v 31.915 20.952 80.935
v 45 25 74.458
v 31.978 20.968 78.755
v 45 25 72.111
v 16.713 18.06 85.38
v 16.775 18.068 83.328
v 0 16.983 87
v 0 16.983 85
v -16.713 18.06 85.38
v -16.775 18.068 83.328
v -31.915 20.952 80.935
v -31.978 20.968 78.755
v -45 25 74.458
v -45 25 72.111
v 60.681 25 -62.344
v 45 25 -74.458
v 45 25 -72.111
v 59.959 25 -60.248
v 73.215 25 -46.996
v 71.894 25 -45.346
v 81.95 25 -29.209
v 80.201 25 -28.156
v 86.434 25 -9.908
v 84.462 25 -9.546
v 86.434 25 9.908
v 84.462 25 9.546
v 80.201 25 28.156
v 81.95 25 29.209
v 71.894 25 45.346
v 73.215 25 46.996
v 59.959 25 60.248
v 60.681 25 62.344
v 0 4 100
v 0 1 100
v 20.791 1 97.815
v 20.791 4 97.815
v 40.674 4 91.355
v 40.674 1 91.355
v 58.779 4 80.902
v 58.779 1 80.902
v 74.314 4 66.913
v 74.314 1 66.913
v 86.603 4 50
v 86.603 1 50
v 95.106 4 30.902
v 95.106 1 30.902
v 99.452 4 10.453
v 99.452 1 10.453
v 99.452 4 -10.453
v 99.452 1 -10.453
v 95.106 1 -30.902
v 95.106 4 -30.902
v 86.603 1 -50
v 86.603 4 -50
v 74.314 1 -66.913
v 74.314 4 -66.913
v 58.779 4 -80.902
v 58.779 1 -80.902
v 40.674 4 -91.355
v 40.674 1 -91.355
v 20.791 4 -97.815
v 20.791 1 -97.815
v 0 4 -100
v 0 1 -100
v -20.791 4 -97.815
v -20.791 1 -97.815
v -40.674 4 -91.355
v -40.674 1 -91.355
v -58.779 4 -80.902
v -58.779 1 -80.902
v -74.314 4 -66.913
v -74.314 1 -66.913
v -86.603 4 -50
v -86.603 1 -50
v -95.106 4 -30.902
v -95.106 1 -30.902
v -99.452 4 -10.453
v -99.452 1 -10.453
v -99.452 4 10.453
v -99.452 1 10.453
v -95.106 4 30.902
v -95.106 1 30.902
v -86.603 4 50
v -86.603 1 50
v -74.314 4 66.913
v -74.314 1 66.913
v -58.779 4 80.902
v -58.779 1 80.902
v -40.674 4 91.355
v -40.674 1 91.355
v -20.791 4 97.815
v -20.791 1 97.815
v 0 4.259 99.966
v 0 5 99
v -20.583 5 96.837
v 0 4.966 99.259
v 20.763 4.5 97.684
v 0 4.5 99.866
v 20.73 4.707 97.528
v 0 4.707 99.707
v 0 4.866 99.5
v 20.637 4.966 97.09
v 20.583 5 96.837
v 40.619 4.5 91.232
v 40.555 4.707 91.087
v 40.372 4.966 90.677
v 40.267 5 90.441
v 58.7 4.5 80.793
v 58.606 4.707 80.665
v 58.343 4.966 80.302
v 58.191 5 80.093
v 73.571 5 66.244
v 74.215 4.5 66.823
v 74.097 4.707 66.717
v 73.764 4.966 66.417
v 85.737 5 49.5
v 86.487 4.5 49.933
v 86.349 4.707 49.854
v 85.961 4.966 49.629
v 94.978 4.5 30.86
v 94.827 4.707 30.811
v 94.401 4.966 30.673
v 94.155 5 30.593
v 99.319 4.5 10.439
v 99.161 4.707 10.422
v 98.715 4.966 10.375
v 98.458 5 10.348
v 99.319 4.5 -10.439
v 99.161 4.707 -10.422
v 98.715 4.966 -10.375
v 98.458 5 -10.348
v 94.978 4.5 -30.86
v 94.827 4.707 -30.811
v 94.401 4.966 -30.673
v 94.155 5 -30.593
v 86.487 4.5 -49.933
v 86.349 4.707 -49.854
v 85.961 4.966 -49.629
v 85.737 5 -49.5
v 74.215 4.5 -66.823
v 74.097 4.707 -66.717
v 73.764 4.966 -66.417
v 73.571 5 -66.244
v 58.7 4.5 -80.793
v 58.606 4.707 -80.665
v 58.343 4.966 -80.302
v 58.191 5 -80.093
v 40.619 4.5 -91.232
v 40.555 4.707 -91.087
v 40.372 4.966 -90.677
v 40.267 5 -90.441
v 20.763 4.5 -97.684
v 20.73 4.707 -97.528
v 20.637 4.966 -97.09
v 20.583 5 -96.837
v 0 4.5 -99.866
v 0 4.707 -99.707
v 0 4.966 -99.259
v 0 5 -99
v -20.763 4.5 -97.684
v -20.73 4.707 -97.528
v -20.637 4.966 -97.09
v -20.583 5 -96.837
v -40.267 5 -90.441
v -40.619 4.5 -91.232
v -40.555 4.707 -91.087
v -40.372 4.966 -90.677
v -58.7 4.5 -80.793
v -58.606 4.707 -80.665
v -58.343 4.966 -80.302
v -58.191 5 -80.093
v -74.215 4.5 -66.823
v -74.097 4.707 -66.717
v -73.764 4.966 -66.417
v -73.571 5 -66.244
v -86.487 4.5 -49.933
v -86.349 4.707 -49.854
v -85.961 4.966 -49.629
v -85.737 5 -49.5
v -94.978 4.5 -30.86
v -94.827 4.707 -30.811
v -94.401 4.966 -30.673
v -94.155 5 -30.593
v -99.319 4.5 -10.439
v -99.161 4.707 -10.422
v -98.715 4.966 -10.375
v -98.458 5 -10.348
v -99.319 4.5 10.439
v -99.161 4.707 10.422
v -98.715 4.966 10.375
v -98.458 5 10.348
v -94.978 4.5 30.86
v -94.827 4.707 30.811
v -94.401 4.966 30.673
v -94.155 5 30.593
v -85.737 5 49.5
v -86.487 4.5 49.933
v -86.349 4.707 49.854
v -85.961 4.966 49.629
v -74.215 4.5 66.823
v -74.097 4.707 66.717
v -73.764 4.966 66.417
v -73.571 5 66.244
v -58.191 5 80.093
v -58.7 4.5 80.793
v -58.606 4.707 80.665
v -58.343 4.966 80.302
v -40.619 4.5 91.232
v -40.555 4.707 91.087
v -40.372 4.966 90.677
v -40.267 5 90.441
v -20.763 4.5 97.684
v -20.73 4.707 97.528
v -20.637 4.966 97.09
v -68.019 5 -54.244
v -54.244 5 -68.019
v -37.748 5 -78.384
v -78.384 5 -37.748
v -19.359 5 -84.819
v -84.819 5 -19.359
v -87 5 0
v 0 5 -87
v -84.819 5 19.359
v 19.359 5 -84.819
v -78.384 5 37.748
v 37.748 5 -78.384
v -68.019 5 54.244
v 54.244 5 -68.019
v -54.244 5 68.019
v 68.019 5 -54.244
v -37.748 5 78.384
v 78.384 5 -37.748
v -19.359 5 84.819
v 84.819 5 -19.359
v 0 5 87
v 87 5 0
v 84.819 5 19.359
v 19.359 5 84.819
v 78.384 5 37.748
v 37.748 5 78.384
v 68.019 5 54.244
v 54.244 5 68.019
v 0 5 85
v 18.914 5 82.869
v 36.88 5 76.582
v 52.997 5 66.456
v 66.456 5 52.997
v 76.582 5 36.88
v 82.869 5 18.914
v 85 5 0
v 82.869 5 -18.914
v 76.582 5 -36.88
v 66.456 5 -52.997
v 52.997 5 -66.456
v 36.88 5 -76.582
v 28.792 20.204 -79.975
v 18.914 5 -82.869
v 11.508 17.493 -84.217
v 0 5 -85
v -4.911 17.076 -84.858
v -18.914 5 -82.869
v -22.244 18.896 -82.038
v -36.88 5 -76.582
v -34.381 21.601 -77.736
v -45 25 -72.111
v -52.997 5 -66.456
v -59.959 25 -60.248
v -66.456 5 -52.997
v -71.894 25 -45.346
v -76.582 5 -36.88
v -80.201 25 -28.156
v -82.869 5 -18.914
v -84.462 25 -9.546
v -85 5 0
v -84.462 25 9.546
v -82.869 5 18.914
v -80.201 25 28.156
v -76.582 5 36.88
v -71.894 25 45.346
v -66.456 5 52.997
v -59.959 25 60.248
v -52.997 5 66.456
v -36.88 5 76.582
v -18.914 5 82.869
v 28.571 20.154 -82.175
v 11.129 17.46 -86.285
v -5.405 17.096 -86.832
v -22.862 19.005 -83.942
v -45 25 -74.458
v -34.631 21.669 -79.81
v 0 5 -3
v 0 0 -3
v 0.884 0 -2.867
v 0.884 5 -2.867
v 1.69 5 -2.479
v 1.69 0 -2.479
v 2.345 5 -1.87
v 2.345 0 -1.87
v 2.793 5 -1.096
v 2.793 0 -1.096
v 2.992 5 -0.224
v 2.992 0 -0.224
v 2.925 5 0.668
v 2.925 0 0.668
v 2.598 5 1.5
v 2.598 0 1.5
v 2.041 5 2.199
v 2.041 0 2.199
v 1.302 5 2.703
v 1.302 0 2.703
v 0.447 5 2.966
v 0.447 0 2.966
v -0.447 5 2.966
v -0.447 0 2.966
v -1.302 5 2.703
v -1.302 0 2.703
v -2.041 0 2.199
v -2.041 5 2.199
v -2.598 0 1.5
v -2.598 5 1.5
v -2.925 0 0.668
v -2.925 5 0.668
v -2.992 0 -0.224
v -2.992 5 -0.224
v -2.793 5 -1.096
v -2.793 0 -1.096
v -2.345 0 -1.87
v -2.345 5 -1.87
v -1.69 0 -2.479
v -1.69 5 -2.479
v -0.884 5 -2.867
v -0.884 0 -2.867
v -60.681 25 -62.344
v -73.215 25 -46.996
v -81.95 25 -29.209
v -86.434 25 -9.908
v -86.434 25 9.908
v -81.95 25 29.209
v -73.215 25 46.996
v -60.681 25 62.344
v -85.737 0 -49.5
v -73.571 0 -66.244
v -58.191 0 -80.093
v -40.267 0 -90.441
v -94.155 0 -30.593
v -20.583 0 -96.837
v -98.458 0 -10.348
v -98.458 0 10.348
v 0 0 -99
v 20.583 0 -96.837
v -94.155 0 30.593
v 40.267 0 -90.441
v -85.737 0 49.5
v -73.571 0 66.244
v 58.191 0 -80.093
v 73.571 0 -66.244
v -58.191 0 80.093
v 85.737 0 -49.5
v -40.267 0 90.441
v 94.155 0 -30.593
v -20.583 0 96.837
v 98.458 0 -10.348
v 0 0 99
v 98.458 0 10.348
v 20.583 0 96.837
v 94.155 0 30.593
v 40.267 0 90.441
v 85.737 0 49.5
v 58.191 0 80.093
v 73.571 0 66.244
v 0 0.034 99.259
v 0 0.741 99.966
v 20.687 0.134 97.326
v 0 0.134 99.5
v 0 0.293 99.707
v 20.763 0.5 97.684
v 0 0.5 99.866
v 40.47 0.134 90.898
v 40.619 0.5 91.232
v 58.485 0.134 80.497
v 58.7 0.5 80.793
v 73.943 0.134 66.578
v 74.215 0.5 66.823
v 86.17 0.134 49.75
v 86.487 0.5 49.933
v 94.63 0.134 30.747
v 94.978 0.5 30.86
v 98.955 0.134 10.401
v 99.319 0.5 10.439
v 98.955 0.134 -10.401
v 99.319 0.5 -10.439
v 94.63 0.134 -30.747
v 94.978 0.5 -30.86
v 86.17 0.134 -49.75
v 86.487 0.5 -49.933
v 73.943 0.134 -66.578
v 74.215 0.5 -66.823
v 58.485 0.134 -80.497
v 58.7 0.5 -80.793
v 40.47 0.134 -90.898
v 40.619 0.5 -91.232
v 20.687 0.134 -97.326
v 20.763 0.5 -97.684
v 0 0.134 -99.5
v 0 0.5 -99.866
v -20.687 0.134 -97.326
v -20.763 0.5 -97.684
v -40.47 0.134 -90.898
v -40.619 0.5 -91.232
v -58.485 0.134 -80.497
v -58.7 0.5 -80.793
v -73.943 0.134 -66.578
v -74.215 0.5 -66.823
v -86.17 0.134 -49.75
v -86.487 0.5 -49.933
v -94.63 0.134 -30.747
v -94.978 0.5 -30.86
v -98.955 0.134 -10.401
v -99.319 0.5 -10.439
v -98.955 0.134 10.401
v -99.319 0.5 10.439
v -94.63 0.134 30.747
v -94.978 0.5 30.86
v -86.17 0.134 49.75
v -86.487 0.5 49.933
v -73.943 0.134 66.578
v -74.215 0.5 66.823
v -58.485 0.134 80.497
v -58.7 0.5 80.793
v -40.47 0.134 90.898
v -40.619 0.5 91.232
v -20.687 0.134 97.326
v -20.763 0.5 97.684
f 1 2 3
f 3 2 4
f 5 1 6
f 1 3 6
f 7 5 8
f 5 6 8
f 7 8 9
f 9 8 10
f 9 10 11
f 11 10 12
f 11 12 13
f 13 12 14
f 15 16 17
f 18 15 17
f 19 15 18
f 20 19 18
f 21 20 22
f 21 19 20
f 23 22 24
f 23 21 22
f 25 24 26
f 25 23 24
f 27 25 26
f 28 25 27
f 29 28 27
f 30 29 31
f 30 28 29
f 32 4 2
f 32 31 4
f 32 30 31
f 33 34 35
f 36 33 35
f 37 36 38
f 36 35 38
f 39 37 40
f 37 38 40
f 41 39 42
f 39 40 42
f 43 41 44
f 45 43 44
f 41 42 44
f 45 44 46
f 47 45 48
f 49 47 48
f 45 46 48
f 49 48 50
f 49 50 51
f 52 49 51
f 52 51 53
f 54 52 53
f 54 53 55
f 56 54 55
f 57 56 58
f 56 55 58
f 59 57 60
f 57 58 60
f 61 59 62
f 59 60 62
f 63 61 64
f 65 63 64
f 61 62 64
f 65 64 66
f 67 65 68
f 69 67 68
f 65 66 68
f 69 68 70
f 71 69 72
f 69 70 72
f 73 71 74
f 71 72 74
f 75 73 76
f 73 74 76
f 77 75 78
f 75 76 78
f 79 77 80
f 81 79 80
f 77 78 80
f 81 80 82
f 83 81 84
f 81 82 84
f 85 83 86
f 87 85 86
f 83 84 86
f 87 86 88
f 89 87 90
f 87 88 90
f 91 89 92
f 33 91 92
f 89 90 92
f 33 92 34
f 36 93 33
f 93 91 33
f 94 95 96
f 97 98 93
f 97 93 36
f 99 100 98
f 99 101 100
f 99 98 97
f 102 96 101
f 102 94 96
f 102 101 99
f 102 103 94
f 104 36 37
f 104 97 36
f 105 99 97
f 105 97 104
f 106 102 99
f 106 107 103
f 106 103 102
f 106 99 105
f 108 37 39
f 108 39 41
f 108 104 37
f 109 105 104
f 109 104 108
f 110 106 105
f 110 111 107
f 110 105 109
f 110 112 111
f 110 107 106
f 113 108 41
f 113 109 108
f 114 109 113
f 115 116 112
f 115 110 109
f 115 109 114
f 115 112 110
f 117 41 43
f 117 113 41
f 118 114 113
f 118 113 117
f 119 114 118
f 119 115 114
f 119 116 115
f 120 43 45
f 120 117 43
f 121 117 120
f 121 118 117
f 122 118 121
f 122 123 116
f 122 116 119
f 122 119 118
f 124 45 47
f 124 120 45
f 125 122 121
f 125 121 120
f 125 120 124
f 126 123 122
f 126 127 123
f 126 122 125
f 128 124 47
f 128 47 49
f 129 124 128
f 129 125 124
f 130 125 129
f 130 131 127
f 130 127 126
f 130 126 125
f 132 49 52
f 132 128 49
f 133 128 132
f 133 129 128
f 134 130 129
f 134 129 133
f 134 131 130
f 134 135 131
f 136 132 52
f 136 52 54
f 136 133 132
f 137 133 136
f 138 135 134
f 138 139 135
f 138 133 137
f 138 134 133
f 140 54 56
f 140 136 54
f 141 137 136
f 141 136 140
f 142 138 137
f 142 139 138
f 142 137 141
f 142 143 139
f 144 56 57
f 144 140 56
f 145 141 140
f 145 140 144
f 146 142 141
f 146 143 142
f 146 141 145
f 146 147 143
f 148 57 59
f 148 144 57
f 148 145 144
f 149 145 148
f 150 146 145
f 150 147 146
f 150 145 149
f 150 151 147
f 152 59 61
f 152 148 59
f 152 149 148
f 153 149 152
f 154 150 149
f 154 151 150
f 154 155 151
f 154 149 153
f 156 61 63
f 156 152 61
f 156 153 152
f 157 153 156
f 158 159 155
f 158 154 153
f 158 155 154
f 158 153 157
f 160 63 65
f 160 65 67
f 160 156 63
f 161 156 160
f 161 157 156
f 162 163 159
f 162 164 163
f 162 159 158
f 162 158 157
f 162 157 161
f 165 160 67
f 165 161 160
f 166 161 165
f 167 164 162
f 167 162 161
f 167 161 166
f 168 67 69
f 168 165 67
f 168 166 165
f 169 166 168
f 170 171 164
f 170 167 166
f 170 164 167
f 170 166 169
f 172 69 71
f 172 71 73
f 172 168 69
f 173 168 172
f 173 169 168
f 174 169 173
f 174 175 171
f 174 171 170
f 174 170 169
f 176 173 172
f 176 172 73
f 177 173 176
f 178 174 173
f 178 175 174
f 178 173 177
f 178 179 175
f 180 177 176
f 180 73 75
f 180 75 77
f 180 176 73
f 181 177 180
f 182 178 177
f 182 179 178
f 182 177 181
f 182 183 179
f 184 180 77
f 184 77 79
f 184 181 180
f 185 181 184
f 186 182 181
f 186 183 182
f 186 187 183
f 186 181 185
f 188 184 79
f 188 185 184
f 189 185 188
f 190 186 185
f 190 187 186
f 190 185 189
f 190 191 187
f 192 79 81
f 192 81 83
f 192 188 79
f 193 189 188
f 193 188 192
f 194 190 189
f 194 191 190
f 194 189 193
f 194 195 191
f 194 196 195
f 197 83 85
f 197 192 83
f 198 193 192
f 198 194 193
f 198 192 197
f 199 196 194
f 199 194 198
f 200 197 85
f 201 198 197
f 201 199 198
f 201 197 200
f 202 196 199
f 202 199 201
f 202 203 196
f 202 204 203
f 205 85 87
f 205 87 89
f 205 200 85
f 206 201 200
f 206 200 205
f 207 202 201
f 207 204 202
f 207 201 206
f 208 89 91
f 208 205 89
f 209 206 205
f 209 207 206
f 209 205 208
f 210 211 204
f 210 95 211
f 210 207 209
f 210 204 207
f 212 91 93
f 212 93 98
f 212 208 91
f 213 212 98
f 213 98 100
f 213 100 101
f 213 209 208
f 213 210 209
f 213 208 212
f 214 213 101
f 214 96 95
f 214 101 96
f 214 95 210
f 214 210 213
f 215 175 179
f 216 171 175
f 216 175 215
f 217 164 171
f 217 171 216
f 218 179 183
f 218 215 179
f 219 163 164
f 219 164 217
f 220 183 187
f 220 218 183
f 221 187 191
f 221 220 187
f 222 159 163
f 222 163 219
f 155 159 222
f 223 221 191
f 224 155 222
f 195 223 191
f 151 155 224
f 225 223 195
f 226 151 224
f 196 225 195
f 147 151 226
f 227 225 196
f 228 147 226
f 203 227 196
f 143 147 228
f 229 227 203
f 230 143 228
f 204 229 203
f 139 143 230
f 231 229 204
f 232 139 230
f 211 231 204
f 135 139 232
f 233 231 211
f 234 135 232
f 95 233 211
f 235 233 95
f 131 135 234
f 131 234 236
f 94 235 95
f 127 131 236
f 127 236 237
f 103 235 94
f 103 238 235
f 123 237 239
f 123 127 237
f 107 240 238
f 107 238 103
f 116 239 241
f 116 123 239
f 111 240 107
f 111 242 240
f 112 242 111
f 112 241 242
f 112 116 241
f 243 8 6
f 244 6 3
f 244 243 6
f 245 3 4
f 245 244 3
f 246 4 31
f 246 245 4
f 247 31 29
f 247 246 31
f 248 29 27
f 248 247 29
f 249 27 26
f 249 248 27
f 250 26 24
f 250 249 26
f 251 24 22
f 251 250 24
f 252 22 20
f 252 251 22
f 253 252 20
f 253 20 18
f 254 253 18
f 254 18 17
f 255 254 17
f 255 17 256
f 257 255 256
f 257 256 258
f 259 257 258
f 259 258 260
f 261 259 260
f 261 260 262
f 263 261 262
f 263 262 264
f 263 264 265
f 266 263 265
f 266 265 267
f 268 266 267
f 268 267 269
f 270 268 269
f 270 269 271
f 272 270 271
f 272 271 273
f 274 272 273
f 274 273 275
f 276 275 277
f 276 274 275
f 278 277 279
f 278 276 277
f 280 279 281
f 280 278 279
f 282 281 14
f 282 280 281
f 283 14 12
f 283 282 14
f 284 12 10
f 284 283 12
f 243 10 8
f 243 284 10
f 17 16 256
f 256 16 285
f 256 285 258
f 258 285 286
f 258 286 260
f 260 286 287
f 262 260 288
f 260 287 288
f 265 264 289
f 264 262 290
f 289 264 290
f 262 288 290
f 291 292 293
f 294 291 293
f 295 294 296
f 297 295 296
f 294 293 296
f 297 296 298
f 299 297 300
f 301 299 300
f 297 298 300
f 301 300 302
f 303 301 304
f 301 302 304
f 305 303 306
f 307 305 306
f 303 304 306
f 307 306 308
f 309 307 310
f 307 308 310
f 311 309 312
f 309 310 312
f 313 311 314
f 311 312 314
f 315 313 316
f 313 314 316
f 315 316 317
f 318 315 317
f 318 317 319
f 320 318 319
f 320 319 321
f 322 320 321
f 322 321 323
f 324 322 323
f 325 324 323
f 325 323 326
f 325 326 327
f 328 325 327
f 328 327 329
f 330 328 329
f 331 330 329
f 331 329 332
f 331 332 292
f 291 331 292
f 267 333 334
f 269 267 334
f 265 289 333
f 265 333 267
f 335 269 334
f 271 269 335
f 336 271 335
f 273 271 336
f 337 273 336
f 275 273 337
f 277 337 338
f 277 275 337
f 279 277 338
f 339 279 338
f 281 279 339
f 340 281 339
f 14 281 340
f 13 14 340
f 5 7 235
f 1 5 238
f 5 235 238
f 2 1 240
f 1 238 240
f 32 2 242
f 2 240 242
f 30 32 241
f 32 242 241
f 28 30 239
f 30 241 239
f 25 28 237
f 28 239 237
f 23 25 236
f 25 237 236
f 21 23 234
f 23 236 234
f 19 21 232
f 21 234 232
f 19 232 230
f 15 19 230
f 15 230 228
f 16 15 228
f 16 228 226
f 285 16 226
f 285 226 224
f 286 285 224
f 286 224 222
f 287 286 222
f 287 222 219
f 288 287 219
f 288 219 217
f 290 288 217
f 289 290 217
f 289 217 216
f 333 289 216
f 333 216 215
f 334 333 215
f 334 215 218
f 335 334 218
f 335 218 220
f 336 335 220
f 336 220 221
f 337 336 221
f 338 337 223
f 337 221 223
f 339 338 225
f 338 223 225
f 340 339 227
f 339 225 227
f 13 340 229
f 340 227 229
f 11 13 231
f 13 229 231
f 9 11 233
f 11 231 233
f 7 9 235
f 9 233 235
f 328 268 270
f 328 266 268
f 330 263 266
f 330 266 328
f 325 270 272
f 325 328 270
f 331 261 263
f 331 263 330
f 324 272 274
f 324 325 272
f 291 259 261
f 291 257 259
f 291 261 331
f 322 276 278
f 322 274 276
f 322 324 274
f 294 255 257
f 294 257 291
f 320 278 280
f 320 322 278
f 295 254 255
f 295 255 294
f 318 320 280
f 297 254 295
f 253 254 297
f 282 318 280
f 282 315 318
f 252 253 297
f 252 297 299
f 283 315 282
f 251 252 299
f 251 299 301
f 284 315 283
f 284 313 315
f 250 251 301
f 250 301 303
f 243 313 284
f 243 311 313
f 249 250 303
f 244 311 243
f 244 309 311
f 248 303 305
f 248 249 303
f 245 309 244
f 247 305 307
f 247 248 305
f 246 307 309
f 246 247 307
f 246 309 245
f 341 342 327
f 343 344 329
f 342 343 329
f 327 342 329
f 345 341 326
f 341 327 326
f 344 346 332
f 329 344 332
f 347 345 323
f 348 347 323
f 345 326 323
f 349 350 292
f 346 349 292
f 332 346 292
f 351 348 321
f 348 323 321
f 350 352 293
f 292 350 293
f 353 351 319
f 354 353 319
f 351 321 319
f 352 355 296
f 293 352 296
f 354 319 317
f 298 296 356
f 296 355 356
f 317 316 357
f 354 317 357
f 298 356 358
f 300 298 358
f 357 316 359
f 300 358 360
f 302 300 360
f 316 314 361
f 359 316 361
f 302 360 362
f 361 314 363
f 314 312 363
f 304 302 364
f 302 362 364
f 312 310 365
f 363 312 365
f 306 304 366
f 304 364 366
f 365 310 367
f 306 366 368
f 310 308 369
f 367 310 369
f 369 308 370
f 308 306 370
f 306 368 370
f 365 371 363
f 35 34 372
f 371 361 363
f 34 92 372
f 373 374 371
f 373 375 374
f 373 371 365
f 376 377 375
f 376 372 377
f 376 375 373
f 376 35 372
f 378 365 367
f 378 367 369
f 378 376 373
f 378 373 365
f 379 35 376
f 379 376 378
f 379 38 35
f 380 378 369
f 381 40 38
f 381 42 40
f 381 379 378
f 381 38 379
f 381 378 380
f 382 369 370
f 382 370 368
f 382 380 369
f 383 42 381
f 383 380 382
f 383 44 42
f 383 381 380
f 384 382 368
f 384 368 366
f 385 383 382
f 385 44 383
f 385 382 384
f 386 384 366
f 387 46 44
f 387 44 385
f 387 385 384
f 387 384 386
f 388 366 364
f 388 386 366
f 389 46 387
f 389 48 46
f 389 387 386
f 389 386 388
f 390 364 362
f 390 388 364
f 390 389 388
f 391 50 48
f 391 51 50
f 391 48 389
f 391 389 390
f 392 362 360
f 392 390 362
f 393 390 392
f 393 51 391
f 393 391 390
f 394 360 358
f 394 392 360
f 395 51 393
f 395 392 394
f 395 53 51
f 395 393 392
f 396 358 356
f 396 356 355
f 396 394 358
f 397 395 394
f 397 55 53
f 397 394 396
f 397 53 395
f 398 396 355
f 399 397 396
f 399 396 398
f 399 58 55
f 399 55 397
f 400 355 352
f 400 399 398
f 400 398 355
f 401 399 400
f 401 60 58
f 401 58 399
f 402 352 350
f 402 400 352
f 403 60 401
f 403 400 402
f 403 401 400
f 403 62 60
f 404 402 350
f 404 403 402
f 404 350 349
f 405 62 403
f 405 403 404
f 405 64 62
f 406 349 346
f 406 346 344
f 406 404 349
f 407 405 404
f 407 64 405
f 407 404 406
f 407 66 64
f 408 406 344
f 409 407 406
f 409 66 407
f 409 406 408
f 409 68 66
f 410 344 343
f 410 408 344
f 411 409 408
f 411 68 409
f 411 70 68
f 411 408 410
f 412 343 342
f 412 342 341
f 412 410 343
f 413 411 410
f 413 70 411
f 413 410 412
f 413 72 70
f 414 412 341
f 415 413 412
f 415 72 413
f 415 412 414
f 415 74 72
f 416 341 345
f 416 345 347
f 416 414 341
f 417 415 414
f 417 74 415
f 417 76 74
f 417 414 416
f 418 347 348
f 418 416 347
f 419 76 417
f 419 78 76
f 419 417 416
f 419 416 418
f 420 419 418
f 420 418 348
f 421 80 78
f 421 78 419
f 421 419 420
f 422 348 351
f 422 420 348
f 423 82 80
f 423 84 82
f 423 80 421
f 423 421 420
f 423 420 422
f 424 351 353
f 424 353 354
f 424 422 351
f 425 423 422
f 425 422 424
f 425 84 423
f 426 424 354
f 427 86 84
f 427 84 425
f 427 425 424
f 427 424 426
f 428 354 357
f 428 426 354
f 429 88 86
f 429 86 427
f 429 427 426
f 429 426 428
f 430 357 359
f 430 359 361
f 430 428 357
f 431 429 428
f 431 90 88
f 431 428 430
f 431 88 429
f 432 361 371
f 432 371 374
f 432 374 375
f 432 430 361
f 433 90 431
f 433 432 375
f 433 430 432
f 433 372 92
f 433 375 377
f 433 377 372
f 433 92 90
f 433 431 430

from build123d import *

# Parameters (mm, degrees)
SKETCH2_R               = 100
BOSS_EXTRUDE1_DEPTH     = 5
SKETCH2_3_R             = 87
SKETCH2_3_R_2           = 85
BOSS_EXTRUDE2_DEPTH     = 25
CUT_EXTRUDE1_DEPTH      = 144.614066163
CUT_EXTRUDE1_DEPTH_BACK = 144.614066163
SKETCH4_R               = 3
CUT_EXTRUDE2_DEPTH      = 144.614066181
FILLET1_R               = 1


with BuildPart() as part:
    # Sketch2 → Boss-Extrude1 (new body)
    with BuildSketch(Plane(origin=(0, 0, 0), x_dir=(1, 0, 0), z_dir=(0, 1, 0))):
        Circle(SKETCH2_R)
    extrude(amount=BOSS_EXTRUDE1_DEPTH)

    # Sketch2<3> → Boss-Extrude2 (add)
    with BuildSketch(Plane(origin=(0, 0, 0), x_dir=(1, 0, 0), z_dir=(0, 1, 0))):
        Circle(SKETCH2_3_R)
        Circle(SKETCH2_3_R_2, mode=Mode.SUBTRACT)
    extrude(amount=BOSS_EXTRUDE2_DEPTH)

    # Sketch3 → Cut-Extrude1 (cut, two sides: drawn at the far end of the back side and taken through both)
    with BuildSketch(Plane.XY.offset(-CUT_EXTRUDE1_DEPTH_BACK)):
        with BuildLine():
            Line((-45, 25), (-45, 27.803999392))
            Line((-45, 27.803999392), (45, 27.803999392))
            Line((45, 27.803999392), (45, 25))
            ThreePointArc((45, 25), (0, 16.983491439), (-45, 25))
        make_face()
    extrude(amount=CUT_EXTRUDE1_DEPTH + CUT_EXTRUDE1_DEPTH_BACK, mode=Mode.SUBTRACT)

    # Sketch4 → Cut-Extrude2 (cut, through all)
    with BuildSketch(Plane.XZ):
        Circle(SKETCH4_R)
    extrude(amount=-CUT_EXTRUDE2_DEPTH, mode=Mode.SUBTRACT)

    # Fillet1
    fillet1_edges = [part.edges().sort_by_distance(p)[0] for p in [
        (-100, 0, 0),
        (-100, 5, 0),
    ]]
    fillet(fillet1_edges, radius=FILLET1_R)


solid = part.part
